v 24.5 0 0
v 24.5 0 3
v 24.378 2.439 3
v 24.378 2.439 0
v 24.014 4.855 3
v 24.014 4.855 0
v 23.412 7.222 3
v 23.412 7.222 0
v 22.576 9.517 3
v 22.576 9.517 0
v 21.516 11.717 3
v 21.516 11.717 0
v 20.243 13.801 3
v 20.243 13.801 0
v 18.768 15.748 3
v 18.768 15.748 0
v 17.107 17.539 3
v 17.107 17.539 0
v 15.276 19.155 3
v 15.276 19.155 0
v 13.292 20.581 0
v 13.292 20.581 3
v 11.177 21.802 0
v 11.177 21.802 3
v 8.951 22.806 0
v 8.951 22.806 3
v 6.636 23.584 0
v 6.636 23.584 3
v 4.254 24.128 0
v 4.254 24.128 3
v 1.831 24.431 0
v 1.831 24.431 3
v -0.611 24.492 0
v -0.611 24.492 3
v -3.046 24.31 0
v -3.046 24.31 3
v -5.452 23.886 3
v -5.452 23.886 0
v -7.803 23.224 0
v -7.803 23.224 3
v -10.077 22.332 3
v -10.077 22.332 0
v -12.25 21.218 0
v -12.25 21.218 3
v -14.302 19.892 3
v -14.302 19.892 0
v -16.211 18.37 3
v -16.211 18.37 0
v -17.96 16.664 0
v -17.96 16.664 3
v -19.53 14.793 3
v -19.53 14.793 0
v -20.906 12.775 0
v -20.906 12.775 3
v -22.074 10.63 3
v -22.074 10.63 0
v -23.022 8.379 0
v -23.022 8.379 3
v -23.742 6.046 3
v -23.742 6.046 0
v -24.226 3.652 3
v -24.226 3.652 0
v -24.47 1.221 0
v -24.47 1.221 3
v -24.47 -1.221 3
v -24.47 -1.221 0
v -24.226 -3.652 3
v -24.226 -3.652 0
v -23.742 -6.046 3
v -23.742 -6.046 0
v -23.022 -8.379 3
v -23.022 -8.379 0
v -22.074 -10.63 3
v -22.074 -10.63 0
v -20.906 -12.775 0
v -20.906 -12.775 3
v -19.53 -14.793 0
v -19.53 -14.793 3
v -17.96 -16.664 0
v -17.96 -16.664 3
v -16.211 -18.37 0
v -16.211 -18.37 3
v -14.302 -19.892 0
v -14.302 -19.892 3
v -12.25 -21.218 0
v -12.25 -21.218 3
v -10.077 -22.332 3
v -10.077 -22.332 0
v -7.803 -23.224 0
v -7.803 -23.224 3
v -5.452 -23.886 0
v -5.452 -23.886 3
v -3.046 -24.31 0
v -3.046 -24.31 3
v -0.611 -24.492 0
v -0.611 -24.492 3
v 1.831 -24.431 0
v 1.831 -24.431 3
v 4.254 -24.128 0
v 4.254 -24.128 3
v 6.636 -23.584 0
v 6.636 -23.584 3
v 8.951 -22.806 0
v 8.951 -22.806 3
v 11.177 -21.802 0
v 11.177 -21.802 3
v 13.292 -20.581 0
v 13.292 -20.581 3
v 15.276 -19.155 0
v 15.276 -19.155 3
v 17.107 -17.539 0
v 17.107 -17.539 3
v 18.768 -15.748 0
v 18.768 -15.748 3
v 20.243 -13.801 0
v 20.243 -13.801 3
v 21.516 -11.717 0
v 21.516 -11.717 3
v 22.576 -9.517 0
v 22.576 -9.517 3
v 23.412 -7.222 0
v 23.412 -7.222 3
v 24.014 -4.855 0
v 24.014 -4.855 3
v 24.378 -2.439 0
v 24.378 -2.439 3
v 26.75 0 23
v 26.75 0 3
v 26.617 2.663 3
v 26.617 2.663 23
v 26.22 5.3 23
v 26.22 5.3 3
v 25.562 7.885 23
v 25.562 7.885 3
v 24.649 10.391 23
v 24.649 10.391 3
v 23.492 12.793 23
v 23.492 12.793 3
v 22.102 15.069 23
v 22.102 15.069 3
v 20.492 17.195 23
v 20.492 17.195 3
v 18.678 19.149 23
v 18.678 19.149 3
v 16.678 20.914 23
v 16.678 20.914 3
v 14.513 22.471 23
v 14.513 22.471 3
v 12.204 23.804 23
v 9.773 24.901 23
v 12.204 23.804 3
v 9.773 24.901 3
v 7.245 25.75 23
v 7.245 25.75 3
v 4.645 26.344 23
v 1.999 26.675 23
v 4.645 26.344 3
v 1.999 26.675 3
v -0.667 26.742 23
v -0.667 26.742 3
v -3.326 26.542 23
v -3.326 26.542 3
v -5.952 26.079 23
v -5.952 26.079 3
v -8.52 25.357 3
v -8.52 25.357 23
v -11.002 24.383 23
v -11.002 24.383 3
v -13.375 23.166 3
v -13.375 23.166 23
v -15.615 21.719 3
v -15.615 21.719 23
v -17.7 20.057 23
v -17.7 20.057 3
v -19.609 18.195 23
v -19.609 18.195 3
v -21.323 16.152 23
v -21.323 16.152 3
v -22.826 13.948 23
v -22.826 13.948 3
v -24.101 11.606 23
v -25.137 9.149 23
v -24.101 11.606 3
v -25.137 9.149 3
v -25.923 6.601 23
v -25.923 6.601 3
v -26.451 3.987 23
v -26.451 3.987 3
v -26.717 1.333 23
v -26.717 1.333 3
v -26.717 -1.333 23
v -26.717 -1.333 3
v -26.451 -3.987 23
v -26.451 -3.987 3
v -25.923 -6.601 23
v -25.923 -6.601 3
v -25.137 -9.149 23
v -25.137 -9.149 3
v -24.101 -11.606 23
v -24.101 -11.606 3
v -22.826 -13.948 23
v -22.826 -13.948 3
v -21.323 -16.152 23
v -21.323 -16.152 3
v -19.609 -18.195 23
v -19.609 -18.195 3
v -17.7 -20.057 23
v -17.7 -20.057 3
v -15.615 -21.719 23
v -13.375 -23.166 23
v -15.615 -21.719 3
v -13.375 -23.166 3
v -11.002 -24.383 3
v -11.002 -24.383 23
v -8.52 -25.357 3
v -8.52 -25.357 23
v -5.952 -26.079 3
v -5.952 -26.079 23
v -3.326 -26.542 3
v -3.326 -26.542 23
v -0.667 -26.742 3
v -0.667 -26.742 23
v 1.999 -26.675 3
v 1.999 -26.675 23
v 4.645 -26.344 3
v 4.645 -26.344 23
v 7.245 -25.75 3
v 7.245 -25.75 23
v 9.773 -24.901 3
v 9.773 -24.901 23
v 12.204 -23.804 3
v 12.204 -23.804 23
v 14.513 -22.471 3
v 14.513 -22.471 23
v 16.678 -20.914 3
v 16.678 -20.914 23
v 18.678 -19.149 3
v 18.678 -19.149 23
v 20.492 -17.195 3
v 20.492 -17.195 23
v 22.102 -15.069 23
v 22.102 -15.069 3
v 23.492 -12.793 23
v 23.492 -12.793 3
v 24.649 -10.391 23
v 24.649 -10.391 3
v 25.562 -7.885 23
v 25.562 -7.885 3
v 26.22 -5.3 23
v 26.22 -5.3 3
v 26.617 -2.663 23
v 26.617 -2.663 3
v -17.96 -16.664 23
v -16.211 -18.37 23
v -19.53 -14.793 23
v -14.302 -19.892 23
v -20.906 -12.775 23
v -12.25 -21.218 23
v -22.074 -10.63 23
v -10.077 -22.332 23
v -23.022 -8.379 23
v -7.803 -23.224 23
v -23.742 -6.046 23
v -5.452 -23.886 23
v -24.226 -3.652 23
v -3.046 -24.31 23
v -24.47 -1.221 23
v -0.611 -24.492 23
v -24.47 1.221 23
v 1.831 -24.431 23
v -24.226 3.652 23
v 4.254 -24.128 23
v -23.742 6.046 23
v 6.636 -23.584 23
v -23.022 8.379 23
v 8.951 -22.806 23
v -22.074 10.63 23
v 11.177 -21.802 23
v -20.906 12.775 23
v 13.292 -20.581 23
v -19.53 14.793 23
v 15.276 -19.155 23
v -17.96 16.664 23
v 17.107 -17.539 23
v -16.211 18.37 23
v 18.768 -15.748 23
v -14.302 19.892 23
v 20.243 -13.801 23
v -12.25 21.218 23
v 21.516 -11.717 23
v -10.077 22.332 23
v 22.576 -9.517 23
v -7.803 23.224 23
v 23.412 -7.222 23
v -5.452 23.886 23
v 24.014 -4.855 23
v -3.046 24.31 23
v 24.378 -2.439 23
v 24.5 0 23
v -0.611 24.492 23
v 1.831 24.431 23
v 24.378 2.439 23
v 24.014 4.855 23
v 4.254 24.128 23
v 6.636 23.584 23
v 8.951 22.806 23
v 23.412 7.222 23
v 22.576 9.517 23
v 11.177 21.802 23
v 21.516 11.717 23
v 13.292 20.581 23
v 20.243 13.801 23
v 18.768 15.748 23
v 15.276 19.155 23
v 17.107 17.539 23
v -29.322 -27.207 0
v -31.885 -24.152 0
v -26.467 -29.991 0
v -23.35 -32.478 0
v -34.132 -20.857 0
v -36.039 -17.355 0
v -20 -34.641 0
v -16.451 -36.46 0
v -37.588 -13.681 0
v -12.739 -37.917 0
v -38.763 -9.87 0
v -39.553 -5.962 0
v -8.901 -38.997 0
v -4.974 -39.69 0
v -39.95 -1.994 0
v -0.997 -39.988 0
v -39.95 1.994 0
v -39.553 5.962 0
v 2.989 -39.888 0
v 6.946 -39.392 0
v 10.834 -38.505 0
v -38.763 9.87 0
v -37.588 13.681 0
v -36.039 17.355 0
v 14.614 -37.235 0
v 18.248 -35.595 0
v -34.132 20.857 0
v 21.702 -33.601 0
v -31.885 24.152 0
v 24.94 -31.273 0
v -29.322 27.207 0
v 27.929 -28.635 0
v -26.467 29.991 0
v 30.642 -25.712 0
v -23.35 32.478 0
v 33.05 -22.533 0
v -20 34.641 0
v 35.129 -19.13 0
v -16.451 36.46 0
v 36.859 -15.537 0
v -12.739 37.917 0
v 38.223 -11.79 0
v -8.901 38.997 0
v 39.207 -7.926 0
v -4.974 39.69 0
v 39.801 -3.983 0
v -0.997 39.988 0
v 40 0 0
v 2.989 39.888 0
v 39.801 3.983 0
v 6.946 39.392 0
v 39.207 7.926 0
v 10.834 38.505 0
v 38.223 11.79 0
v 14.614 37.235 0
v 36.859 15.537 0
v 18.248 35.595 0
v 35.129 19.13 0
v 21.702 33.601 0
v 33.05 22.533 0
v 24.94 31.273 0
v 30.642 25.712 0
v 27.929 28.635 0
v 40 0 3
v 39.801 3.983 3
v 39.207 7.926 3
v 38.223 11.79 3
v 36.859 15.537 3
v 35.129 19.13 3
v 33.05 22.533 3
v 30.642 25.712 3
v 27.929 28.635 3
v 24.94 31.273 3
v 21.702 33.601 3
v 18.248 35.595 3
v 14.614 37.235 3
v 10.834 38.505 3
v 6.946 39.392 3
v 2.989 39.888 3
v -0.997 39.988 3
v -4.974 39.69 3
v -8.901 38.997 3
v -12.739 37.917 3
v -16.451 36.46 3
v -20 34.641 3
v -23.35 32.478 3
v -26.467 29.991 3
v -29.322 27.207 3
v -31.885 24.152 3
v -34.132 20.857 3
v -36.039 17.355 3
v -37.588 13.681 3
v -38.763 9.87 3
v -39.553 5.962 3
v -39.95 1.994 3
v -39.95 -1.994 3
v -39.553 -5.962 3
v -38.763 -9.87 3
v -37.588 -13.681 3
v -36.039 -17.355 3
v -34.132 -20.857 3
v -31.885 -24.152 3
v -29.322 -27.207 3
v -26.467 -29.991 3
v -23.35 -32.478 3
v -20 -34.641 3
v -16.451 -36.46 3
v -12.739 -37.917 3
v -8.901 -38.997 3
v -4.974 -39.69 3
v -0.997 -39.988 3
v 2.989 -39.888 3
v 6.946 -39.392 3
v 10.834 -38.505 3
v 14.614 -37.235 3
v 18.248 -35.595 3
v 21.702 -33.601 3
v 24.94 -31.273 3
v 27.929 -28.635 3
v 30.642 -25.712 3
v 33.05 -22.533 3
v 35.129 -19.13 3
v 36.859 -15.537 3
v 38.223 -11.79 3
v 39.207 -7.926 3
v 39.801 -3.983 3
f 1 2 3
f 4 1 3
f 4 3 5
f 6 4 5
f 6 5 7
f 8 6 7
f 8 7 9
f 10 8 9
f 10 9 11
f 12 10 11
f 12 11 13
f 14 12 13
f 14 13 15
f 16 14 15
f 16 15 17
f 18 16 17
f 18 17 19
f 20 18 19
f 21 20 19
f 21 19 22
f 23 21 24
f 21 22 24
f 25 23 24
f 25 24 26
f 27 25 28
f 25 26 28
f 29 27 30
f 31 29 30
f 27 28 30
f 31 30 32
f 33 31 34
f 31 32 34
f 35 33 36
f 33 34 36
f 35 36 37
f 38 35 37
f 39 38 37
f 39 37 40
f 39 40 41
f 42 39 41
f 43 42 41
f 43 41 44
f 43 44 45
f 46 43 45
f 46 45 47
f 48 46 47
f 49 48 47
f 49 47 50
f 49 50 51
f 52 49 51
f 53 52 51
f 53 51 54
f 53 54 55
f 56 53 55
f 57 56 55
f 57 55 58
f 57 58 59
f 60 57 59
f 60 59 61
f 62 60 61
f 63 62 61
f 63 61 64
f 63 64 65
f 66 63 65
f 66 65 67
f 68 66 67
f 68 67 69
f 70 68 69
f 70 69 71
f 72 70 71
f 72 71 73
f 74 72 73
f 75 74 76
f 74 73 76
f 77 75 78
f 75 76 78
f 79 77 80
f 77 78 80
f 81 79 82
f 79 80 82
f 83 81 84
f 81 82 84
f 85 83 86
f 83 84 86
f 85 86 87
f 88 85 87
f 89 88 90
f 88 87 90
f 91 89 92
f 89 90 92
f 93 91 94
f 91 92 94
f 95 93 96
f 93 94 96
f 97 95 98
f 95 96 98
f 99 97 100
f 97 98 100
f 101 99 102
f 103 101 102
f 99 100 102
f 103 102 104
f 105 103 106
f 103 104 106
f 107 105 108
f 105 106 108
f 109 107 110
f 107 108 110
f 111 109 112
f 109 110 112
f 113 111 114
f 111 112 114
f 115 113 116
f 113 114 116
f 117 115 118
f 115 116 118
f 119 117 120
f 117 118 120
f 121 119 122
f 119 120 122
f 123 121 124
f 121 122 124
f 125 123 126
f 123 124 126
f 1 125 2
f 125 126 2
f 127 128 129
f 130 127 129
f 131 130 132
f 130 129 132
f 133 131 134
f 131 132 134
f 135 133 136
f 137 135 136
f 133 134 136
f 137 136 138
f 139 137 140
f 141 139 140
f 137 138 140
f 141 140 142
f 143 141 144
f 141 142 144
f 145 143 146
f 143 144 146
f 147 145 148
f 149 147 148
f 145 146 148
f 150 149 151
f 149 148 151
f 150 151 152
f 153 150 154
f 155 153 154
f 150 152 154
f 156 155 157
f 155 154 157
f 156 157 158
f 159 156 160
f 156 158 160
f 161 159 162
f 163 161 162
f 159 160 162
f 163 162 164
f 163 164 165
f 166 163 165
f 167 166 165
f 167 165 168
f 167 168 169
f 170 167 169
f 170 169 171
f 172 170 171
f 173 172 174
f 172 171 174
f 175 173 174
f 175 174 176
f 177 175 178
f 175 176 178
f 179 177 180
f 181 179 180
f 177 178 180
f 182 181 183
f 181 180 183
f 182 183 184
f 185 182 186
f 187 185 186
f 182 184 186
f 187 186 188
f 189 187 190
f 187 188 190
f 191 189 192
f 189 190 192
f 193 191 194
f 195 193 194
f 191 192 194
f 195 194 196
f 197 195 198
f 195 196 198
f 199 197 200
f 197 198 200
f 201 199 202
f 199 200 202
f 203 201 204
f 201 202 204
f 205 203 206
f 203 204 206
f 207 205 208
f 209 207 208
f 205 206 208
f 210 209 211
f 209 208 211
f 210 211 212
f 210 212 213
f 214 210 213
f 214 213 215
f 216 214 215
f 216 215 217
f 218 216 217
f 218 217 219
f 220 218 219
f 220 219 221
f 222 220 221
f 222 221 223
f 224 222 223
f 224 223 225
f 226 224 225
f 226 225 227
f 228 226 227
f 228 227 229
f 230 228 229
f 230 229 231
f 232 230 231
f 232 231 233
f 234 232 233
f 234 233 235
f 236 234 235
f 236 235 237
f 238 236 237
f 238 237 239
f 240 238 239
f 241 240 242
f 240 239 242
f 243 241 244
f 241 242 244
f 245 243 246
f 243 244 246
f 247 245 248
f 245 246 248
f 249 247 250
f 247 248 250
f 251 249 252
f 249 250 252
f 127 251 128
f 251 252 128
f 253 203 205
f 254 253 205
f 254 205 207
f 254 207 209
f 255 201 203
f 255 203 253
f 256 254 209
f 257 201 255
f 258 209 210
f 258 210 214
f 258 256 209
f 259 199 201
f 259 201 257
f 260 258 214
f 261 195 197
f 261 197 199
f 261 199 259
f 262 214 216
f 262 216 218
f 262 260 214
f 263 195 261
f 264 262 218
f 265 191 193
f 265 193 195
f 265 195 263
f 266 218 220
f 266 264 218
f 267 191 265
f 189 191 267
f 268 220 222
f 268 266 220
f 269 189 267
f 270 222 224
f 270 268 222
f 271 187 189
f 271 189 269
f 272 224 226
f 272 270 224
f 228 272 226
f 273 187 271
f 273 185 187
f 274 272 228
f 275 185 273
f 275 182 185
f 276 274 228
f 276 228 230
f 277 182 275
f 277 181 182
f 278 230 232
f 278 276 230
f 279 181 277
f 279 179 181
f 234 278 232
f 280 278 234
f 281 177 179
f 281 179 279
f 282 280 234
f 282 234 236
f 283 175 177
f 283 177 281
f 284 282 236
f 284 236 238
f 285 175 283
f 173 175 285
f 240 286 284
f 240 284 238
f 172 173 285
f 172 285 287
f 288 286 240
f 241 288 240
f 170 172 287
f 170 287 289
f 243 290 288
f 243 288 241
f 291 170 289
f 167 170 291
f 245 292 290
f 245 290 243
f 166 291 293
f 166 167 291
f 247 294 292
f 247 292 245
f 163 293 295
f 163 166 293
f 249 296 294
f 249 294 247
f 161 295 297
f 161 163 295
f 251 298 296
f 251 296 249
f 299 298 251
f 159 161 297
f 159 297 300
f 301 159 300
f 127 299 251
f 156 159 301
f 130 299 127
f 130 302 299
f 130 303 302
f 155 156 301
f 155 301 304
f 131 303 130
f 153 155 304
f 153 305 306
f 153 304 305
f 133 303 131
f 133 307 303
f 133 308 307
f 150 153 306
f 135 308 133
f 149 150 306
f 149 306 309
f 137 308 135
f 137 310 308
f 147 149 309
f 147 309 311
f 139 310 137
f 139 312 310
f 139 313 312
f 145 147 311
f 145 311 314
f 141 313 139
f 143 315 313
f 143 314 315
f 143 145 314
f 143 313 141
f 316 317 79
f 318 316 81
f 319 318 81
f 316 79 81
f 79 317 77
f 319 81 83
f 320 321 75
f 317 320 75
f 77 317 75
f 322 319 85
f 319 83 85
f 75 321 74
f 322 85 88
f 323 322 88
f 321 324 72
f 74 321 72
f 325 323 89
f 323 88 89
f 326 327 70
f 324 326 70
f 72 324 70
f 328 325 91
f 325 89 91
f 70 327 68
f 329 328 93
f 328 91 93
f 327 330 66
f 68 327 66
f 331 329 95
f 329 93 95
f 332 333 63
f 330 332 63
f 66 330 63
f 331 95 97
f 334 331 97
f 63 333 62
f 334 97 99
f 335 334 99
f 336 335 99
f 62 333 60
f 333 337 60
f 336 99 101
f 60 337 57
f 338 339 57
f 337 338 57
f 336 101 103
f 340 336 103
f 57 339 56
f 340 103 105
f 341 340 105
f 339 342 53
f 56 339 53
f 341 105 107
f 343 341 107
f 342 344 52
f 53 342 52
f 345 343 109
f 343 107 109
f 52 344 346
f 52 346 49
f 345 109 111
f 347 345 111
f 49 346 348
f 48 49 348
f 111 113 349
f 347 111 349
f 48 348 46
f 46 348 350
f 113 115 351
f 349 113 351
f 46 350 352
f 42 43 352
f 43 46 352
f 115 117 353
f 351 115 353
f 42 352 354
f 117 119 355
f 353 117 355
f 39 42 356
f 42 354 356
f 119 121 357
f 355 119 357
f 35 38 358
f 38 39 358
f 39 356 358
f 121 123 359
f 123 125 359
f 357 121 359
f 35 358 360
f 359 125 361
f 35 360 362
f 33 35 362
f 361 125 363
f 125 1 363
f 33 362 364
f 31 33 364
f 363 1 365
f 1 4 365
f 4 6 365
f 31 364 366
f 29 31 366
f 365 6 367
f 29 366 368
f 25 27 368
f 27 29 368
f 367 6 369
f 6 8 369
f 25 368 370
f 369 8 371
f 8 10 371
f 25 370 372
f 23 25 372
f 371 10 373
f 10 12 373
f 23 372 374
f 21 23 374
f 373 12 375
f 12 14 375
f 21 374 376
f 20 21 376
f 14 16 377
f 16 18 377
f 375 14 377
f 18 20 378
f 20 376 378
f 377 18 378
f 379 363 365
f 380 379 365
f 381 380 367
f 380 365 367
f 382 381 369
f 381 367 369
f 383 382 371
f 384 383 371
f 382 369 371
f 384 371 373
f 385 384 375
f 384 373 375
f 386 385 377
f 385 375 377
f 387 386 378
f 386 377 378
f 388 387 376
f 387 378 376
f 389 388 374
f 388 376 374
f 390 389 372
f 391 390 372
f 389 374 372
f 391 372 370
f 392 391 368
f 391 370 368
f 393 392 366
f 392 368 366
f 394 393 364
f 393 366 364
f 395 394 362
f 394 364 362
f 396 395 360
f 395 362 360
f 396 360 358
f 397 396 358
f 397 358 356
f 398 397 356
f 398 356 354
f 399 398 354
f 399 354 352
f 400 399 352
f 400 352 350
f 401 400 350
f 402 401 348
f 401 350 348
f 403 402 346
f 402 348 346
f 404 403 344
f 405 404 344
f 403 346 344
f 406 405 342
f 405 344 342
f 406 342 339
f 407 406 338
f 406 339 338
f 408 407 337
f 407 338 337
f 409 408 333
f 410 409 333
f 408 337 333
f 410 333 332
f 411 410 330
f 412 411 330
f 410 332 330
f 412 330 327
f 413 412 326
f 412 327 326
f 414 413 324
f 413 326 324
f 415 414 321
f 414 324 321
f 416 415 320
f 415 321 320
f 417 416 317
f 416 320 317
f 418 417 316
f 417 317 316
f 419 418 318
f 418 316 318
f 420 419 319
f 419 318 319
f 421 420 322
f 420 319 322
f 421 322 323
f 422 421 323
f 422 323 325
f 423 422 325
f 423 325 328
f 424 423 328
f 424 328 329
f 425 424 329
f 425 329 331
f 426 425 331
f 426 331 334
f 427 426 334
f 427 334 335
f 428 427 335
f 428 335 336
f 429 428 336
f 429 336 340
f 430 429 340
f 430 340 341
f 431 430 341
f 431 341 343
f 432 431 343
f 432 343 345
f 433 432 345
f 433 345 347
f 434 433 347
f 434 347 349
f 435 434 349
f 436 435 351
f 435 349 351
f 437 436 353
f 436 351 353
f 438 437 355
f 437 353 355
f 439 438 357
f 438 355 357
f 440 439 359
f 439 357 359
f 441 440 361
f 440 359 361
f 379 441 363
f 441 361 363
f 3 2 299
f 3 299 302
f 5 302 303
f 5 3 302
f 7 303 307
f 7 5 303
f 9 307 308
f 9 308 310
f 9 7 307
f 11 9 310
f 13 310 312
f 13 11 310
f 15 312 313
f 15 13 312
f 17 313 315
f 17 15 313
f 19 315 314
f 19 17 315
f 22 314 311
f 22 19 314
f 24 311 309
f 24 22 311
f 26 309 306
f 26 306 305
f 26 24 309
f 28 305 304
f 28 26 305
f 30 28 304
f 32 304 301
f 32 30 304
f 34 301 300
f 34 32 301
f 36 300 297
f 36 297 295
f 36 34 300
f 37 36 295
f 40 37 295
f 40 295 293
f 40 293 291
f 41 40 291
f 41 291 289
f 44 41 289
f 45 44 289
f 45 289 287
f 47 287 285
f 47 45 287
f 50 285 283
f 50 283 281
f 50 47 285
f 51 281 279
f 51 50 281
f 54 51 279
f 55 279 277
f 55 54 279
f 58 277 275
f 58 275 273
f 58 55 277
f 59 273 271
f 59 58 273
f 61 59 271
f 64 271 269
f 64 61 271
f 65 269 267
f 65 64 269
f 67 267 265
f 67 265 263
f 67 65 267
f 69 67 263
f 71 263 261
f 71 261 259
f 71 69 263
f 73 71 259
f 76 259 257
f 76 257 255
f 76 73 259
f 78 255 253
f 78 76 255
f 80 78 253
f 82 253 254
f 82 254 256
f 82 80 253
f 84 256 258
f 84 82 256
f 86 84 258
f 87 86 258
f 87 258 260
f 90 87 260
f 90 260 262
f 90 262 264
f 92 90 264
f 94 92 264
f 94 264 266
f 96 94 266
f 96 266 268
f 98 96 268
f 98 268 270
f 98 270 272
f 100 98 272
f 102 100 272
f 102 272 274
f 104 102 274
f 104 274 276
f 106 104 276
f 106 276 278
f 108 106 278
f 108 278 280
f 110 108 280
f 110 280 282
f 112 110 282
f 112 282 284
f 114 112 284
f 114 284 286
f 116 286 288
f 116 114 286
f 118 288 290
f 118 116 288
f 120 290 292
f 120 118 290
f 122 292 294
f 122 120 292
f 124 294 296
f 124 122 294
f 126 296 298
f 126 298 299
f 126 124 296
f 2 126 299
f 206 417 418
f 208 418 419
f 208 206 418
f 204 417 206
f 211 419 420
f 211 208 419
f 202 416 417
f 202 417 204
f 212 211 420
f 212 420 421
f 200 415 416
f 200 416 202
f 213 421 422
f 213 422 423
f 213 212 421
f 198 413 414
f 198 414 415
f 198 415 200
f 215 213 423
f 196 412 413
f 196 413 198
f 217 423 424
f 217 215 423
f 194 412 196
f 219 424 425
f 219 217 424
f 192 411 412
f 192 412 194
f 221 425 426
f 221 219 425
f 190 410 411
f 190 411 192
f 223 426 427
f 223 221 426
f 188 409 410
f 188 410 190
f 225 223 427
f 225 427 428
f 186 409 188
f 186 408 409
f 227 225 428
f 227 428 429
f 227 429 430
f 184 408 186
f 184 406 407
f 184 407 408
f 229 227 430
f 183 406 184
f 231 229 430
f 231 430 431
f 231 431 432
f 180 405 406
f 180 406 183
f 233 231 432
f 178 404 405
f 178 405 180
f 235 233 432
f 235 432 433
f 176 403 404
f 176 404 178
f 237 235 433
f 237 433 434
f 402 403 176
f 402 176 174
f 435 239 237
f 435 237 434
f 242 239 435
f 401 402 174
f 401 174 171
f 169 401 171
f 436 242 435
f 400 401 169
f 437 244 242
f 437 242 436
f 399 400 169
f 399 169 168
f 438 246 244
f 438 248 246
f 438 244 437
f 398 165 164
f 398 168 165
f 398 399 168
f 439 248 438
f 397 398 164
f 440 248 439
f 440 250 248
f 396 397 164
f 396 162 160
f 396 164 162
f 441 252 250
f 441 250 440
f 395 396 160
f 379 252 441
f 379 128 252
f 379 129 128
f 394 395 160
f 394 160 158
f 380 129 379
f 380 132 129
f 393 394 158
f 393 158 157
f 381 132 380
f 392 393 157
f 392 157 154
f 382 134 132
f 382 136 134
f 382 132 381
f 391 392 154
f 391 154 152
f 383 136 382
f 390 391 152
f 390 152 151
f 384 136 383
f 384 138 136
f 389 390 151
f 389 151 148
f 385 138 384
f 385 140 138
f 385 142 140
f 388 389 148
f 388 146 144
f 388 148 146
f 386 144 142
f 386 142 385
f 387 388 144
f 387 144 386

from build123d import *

# Parameters (mm, degrees)
F0_R     = 40
F1_DEPTH = 3
F2_R     = 26.75
F2_R_2   = 24.5
F3_DEPTH = 20
F4_DEPTH = 3.001


with BuildPart() as f1:
    # F0 (on Top) → F1 (new body)
    with BuildSketch(Plane.XY):
        Circle(F0_R)
    extrude(amount=F1_DEPTH)

    # F2 (on face) → F3 (join)
    with BuildSketch(Plane.XY.offset(3)):
        Circle(F2_R)
        Circle(F2_R_2, mode=Mode.SUBTRACT)
    extrude(amount=F3_DEPTH)

    # F2 (on face) → F4 (cut, through all)
    with BuildSketch(Plane.XY.offset(3)):
        Circle(F2_R_2)
    extrude(amount=-F4_DEPTH, mode=Mode.SUBTRACT)


solid = f1.part
